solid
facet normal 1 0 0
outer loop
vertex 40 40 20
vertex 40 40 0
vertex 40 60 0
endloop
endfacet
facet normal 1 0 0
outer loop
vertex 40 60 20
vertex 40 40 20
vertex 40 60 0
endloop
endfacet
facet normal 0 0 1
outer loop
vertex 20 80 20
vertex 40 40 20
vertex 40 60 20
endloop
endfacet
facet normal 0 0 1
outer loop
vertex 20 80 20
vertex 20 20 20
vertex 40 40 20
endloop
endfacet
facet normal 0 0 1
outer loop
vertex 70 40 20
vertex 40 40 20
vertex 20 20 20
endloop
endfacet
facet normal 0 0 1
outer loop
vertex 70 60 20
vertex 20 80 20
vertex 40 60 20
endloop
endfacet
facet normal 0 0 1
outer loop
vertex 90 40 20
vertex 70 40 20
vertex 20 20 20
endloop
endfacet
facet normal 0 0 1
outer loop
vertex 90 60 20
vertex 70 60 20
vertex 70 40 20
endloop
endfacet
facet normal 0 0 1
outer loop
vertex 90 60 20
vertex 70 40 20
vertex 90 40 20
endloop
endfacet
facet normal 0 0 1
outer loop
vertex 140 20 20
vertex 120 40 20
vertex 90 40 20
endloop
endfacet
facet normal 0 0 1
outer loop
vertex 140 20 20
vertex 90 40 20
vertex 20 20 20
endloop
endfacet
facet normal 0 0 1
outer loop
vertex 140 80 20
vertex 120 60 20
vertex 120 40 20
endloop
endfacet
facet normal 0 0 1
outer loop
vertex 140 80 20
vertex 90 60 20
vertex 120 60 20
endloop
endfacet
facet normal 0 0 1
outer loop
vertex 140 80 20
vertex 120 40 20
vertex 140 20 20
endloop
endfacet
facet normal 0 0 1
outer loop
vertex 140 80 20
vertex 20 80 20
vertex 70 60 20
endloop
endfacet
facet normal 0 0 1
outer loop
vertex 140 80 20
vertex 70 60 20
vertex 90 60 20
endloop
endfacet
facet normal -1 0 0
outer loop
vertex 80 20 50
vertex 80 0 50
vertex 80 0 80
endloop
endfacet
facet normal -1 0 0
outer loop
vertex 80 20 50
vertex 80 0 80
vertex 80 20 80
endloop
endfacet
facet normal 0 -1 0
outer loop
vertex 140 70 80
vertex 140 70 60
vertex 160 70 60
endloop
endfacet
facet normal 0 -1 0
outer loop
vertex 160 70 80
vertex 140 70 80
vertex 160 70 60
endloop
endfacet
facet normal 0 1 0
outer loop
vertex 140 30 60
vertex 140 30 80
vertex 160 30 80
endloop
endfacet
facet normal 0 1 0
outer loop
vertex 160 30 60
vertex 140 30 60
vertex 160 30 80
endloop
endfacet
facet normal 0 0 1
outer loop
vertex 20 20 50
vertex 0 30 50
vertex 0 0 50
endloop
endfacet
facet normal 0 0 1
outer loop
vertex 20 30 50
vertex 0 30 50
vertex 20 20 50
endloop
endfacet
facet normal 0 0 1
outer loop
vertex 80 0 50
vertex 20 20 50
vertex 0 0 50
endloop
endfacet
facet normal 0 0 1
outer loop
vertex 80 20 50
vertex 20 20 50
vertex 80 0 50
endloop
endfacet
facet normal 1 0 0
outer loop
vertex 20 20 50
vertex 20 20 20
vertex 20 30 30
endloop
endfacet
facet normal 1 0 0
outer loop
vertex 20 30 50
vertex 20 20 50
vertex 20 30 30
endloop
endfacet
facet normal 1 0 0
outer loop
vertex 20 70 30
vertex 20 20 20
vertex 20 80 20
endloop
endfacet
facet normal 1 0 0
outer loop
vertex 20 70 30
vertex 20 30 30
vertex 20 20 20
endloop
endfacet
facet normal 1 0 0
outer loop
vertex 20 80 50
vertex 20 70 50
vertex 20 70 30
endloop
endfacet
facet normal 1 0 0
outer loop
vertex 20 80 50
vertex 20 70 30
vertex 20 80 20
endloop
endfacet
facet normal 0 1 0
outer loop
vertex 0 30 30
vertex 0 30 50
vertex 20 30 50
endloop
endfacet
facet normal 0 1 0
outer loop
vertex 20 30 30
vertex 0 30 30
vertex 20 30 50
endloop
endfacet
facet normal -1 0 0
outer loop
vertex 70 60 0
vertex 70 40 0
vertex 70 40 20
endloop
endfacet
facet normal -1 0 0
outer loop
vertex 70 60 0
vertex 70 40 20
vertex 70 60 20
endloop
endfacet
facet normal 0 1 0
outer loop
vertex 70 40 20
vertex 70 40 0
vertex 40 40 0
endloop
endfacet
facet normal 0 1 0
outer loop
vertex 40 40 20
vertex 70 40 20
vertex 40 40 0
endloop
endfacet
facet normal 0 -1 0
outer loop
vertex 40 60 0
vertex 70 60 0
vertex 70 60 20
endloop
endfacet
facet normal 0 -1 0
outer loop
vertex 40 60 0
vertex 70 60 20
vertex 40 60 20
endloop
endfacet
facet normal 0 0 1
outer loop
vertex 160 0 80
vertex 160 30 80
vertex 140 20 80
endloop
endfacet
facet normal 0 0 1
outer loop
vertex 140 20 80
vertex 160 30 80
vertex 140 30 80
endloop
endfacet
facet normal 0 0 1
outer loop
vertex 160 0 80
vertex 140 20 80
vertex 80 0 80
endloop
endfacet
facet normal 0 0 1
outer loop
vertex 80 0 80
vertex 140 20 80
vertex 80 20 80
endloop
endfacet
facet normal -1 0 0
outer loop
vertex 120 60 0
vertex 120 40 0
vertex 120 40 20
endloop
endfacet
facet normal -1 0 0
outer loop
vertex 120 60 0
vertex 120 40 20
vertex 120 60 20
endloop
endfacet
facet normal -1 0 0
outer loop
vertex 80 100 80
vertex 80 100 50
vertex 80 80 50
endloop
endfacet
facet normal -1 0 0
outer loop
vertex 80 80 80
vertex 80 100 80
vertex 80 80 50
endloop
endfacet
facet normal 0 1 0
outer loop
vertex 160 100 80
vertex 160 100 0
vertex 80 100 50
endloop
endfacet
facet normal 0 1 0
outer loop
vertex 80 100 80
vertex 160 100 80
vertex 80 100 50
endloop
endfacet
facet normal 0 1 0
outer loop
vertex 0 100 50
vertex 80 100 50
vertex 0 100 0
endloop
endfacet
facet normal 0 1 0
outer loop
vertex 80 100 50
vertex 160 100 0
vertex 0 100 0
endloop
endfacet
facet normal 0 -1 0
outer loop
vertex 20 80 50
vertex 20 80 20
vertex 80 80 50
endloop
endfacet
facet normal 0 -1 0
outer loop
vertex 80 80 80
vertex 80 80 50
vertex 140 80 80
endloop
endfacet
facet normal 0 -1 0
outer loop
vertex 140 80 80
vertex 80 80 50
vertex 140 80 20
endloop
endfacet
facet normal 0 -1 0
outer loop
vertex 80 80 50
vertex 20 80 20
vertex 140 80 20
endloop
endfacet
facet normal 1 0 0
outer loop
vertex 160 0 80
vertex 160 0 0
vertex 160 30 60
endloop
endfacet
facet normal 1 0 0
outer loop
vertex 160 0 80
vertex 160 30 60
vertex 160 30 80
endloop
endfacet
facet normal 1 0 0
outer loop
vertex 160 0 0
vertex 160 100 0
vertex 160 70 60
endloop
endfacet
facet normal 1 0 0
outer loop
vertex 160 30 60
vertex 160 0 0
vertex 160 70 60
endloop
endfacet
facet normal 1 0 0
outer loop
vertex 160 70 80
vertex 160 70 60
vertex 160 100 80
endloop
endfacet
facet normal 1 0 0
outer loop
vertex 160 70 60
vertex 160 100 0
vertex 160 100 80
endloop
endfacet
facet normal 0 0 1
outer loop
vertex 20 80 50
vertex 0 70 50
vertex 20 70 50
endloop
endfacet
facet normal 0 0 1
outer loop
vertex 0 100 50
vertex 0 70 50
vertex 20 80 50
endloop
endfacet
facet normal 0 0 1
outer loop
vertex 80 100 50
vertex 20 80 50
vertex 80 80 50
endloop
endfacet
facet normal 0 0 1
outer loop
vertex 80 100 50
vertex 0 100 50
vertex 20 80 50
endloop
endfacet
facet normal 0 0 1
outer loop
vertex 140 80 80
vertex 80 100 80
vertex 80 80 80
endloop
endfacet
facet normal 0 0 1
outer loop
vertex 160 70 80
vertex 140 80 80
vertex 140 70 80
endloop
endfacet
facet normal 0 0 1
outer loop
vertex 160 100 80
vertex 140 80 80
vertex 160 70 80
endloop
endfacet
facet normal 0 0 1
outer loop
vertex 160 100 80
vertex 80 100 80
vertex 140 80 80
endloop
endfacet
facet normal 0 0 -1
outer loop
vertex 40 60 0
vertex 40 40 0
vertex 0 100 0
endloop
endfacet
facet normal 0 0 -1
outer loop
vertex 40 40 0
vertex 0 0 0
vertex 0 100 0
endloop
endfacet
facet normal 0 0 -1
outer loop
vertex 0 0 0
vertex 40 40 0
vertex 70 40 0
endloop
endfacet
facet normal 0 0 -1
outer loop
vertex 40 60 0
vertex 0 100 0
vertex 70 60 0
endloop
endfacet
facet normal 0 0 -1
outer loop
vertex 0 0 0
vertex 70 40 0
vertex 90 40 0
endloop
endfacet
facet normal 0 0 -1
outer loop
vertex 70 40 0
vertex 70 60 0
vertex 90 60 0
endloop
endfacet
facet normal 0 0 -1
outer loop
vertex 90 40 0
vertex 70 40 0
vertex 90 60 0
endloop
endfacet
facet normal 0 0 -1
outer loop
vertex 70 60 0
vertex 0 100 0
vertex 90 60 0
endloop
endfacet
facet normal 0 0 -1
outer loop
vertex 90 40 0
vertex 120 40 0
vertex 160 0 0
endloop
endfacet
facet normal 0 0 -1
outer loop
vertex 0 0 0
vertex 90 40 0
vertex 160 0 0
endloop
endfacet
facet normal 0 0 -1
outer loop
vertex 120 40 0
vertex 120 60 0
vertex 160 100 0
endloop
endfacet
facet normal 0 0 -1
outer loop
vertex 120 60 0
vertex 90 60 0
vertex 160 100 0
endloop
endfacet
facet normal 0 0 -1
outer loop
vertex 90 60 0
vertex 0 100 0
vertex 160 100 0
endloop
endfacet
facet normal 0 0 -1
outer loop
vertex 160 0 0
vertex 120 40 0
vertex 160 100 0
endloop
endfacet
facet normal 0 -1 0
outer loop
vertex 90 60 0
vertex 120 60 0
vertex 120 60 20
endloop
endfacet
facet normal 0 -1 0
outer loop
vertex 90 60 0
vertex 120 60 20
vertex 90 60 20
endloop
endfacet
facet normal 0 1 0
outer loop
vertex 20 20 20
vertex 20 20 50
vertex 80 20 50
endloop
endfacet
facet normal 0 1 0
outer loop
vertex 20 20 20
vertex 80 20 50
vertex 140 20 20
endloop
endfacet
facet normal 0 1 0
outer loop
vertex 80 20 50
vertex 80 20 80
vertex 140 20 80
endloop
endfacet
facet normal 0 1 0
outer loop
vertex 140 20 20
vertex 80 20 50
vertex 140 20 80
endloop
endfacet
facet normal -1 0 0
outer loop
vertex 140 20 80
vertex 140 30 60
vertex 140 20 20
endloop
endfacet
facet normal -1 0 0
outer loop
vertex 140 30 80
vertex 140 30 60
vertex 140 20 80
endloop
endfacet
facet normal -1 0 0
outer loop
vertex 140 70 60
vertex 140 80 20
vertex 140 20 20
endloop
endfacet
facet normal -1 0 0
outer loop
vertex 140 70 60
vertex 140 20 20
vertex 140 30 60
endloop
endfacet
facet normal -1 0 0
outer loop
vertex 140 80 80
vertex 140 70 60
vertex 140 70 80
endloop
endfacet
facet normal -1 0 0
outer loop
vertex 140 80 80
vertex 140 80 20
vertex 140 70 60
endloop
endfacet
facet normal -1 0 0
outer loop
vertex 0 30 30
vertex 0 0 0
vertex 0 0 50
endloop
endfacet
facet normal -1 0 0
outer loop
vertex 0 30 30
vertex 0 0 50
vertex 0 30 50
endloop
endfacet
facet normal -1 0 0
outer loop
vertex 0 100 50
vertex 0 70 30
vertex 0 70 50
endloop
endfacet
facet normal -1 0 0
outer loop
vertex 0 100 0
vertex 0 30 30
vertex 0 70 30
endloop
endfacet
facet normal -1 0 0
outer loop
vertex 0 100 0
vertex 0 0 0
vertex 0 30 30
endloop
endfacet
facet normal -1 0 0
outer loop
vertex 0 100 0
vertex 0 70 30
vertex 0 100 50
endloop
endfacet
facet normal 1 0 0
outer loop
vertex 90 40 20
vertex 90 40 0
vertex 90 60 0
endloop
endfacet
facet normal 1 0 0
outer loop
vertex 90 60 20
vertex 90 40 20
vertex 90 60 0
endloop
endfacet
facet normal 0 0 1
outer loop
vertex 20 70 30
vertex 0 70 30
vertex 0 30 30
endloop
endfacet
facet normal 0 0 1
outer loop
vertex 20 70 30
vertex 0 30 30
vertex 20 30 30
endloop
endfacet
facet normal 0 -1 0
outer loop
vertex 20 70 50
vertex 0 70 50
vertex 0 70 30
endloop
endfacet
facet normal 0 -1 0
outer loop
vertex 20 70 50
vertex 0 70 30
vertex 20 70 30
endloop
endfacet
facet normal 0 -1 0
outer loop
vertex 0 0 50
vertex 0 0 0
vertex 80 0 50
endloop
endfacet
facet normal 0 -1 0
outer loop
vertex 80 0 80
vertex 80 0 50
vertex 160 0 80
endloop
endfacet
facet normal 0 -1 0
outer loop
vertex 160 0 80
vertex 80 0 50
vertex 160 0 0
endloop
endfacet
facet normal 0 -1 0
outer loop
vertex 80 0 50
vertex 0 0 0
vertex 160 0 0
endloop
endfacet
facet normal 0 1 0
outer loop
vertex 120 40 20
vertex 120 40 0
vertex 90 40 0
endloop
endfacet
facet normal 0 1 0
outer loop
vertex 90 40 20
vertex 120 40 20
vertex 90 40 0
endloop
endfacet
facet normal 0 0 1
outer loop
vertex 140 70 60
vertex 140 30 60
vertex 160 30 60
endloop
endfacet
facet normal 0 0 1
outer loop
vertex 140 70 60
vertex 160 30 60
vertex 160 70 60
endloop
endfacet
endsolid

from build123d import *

# Parameters (mm, degrees)
SKETCH1_W           = 160
SKETCH1_H           = 100
BOSS_EXTRUDE1_DEPTH = 50
SKETCH2_W           = 20
SKETCH2_H           = 40
CUT_EXTRUDE1_DEPTH  = 20
SKETCH3_W           = 30
SKETCH3_H           = 20
CUT_EXTRUDE2_DEPTH  = 20
SKETCH4_W           = 120
SKETCH4_H           = 60
CUT_EXTRUDE3_DEPTH  = 30
BOSS_EXTRUDE2_DEPTH = 30
SKETCH8_W           = 30
SKETCH8_H           = 40
BOSS_EXTRUDE3_DEPTH = 20


with BuildPart() as part:
    # Sketch1 → Boss-Extrude1 (new body)
    with BuildSketch(Plane.XY):
        with Locations((80, 50)):
            Rectangle(SKETCH1_W, SKETCH1_H)
    extrude(amount=BOSS_EXTRUDE1_DEPTH)

    # Sketch2 → Cut-Extrude1 (cut)
    with BuildSketch(Plane.XY.offset(50)):
        with Locations((10, 50)):
            Rectangle(SKETCH2_W, SKETCH2_H)
        with Locations((150, 50)):
            Rectangle(SKETCH2_W, SKETCH2_H)
    extrude(amount=-CUT_EXTRUDE1_DEPTH, mode=Mode.SUBTRACT)

    # Sketch3 → Cut-Extrude2 (cut)
    with BuildSketch(Plane(origin=(0, 0, 0), x_dir=(-1, 0, 0), z_dir=(0, 0, -1))):
        with Locations((-55, 50)):
            Rectangle(SKETCH3_W, SKETCH3_H)
        with Locations((-105, 50)):
            Rectangle(SKETCH3_W, SKETCH3_H)
    extrude(amount=-CUT_EXTRUDE2_DEPTH, mode=Mode.SUBTRACT)

    # Sketch4 → Cut-Extrude3 (cut)
    with BuildSketch(Plane.XY.offset(50)):
        with Locations((80, 50)):
            Rectangle(SKETCH4_W, SKETCH4_H)
    extrude(amount=-CUT_EXTRUDE3_DEPTH, mode=Mode.SUBTRACT)

    # Sketch5 → Boss-Extrude2 (add)
    with BuildSketch(Plane.XY.offset(50)):
        Polygon((80, 100), (80, 80), (140, 80), (140, 70), (160, 70), (160, 100), align=None)
        Polygon((80, 0), (80, 20), (140, 20), (140, 30), (160, 30), (160, 0), align=None)
    extrude(amount=BOSS_EXTRUDE2_DEPTH)

    # Sketch8 → Boss-Extrude3 (add)
    with BuildSketch(Plane.ZY.offset(-140)):
        with Locations((45, 50)):
            Rectangle(SKETCH8_W, SKETCH8_H)
    extrude(amount=-BOSS_EXTRUDE3_DEPTH)


solid = part.part
